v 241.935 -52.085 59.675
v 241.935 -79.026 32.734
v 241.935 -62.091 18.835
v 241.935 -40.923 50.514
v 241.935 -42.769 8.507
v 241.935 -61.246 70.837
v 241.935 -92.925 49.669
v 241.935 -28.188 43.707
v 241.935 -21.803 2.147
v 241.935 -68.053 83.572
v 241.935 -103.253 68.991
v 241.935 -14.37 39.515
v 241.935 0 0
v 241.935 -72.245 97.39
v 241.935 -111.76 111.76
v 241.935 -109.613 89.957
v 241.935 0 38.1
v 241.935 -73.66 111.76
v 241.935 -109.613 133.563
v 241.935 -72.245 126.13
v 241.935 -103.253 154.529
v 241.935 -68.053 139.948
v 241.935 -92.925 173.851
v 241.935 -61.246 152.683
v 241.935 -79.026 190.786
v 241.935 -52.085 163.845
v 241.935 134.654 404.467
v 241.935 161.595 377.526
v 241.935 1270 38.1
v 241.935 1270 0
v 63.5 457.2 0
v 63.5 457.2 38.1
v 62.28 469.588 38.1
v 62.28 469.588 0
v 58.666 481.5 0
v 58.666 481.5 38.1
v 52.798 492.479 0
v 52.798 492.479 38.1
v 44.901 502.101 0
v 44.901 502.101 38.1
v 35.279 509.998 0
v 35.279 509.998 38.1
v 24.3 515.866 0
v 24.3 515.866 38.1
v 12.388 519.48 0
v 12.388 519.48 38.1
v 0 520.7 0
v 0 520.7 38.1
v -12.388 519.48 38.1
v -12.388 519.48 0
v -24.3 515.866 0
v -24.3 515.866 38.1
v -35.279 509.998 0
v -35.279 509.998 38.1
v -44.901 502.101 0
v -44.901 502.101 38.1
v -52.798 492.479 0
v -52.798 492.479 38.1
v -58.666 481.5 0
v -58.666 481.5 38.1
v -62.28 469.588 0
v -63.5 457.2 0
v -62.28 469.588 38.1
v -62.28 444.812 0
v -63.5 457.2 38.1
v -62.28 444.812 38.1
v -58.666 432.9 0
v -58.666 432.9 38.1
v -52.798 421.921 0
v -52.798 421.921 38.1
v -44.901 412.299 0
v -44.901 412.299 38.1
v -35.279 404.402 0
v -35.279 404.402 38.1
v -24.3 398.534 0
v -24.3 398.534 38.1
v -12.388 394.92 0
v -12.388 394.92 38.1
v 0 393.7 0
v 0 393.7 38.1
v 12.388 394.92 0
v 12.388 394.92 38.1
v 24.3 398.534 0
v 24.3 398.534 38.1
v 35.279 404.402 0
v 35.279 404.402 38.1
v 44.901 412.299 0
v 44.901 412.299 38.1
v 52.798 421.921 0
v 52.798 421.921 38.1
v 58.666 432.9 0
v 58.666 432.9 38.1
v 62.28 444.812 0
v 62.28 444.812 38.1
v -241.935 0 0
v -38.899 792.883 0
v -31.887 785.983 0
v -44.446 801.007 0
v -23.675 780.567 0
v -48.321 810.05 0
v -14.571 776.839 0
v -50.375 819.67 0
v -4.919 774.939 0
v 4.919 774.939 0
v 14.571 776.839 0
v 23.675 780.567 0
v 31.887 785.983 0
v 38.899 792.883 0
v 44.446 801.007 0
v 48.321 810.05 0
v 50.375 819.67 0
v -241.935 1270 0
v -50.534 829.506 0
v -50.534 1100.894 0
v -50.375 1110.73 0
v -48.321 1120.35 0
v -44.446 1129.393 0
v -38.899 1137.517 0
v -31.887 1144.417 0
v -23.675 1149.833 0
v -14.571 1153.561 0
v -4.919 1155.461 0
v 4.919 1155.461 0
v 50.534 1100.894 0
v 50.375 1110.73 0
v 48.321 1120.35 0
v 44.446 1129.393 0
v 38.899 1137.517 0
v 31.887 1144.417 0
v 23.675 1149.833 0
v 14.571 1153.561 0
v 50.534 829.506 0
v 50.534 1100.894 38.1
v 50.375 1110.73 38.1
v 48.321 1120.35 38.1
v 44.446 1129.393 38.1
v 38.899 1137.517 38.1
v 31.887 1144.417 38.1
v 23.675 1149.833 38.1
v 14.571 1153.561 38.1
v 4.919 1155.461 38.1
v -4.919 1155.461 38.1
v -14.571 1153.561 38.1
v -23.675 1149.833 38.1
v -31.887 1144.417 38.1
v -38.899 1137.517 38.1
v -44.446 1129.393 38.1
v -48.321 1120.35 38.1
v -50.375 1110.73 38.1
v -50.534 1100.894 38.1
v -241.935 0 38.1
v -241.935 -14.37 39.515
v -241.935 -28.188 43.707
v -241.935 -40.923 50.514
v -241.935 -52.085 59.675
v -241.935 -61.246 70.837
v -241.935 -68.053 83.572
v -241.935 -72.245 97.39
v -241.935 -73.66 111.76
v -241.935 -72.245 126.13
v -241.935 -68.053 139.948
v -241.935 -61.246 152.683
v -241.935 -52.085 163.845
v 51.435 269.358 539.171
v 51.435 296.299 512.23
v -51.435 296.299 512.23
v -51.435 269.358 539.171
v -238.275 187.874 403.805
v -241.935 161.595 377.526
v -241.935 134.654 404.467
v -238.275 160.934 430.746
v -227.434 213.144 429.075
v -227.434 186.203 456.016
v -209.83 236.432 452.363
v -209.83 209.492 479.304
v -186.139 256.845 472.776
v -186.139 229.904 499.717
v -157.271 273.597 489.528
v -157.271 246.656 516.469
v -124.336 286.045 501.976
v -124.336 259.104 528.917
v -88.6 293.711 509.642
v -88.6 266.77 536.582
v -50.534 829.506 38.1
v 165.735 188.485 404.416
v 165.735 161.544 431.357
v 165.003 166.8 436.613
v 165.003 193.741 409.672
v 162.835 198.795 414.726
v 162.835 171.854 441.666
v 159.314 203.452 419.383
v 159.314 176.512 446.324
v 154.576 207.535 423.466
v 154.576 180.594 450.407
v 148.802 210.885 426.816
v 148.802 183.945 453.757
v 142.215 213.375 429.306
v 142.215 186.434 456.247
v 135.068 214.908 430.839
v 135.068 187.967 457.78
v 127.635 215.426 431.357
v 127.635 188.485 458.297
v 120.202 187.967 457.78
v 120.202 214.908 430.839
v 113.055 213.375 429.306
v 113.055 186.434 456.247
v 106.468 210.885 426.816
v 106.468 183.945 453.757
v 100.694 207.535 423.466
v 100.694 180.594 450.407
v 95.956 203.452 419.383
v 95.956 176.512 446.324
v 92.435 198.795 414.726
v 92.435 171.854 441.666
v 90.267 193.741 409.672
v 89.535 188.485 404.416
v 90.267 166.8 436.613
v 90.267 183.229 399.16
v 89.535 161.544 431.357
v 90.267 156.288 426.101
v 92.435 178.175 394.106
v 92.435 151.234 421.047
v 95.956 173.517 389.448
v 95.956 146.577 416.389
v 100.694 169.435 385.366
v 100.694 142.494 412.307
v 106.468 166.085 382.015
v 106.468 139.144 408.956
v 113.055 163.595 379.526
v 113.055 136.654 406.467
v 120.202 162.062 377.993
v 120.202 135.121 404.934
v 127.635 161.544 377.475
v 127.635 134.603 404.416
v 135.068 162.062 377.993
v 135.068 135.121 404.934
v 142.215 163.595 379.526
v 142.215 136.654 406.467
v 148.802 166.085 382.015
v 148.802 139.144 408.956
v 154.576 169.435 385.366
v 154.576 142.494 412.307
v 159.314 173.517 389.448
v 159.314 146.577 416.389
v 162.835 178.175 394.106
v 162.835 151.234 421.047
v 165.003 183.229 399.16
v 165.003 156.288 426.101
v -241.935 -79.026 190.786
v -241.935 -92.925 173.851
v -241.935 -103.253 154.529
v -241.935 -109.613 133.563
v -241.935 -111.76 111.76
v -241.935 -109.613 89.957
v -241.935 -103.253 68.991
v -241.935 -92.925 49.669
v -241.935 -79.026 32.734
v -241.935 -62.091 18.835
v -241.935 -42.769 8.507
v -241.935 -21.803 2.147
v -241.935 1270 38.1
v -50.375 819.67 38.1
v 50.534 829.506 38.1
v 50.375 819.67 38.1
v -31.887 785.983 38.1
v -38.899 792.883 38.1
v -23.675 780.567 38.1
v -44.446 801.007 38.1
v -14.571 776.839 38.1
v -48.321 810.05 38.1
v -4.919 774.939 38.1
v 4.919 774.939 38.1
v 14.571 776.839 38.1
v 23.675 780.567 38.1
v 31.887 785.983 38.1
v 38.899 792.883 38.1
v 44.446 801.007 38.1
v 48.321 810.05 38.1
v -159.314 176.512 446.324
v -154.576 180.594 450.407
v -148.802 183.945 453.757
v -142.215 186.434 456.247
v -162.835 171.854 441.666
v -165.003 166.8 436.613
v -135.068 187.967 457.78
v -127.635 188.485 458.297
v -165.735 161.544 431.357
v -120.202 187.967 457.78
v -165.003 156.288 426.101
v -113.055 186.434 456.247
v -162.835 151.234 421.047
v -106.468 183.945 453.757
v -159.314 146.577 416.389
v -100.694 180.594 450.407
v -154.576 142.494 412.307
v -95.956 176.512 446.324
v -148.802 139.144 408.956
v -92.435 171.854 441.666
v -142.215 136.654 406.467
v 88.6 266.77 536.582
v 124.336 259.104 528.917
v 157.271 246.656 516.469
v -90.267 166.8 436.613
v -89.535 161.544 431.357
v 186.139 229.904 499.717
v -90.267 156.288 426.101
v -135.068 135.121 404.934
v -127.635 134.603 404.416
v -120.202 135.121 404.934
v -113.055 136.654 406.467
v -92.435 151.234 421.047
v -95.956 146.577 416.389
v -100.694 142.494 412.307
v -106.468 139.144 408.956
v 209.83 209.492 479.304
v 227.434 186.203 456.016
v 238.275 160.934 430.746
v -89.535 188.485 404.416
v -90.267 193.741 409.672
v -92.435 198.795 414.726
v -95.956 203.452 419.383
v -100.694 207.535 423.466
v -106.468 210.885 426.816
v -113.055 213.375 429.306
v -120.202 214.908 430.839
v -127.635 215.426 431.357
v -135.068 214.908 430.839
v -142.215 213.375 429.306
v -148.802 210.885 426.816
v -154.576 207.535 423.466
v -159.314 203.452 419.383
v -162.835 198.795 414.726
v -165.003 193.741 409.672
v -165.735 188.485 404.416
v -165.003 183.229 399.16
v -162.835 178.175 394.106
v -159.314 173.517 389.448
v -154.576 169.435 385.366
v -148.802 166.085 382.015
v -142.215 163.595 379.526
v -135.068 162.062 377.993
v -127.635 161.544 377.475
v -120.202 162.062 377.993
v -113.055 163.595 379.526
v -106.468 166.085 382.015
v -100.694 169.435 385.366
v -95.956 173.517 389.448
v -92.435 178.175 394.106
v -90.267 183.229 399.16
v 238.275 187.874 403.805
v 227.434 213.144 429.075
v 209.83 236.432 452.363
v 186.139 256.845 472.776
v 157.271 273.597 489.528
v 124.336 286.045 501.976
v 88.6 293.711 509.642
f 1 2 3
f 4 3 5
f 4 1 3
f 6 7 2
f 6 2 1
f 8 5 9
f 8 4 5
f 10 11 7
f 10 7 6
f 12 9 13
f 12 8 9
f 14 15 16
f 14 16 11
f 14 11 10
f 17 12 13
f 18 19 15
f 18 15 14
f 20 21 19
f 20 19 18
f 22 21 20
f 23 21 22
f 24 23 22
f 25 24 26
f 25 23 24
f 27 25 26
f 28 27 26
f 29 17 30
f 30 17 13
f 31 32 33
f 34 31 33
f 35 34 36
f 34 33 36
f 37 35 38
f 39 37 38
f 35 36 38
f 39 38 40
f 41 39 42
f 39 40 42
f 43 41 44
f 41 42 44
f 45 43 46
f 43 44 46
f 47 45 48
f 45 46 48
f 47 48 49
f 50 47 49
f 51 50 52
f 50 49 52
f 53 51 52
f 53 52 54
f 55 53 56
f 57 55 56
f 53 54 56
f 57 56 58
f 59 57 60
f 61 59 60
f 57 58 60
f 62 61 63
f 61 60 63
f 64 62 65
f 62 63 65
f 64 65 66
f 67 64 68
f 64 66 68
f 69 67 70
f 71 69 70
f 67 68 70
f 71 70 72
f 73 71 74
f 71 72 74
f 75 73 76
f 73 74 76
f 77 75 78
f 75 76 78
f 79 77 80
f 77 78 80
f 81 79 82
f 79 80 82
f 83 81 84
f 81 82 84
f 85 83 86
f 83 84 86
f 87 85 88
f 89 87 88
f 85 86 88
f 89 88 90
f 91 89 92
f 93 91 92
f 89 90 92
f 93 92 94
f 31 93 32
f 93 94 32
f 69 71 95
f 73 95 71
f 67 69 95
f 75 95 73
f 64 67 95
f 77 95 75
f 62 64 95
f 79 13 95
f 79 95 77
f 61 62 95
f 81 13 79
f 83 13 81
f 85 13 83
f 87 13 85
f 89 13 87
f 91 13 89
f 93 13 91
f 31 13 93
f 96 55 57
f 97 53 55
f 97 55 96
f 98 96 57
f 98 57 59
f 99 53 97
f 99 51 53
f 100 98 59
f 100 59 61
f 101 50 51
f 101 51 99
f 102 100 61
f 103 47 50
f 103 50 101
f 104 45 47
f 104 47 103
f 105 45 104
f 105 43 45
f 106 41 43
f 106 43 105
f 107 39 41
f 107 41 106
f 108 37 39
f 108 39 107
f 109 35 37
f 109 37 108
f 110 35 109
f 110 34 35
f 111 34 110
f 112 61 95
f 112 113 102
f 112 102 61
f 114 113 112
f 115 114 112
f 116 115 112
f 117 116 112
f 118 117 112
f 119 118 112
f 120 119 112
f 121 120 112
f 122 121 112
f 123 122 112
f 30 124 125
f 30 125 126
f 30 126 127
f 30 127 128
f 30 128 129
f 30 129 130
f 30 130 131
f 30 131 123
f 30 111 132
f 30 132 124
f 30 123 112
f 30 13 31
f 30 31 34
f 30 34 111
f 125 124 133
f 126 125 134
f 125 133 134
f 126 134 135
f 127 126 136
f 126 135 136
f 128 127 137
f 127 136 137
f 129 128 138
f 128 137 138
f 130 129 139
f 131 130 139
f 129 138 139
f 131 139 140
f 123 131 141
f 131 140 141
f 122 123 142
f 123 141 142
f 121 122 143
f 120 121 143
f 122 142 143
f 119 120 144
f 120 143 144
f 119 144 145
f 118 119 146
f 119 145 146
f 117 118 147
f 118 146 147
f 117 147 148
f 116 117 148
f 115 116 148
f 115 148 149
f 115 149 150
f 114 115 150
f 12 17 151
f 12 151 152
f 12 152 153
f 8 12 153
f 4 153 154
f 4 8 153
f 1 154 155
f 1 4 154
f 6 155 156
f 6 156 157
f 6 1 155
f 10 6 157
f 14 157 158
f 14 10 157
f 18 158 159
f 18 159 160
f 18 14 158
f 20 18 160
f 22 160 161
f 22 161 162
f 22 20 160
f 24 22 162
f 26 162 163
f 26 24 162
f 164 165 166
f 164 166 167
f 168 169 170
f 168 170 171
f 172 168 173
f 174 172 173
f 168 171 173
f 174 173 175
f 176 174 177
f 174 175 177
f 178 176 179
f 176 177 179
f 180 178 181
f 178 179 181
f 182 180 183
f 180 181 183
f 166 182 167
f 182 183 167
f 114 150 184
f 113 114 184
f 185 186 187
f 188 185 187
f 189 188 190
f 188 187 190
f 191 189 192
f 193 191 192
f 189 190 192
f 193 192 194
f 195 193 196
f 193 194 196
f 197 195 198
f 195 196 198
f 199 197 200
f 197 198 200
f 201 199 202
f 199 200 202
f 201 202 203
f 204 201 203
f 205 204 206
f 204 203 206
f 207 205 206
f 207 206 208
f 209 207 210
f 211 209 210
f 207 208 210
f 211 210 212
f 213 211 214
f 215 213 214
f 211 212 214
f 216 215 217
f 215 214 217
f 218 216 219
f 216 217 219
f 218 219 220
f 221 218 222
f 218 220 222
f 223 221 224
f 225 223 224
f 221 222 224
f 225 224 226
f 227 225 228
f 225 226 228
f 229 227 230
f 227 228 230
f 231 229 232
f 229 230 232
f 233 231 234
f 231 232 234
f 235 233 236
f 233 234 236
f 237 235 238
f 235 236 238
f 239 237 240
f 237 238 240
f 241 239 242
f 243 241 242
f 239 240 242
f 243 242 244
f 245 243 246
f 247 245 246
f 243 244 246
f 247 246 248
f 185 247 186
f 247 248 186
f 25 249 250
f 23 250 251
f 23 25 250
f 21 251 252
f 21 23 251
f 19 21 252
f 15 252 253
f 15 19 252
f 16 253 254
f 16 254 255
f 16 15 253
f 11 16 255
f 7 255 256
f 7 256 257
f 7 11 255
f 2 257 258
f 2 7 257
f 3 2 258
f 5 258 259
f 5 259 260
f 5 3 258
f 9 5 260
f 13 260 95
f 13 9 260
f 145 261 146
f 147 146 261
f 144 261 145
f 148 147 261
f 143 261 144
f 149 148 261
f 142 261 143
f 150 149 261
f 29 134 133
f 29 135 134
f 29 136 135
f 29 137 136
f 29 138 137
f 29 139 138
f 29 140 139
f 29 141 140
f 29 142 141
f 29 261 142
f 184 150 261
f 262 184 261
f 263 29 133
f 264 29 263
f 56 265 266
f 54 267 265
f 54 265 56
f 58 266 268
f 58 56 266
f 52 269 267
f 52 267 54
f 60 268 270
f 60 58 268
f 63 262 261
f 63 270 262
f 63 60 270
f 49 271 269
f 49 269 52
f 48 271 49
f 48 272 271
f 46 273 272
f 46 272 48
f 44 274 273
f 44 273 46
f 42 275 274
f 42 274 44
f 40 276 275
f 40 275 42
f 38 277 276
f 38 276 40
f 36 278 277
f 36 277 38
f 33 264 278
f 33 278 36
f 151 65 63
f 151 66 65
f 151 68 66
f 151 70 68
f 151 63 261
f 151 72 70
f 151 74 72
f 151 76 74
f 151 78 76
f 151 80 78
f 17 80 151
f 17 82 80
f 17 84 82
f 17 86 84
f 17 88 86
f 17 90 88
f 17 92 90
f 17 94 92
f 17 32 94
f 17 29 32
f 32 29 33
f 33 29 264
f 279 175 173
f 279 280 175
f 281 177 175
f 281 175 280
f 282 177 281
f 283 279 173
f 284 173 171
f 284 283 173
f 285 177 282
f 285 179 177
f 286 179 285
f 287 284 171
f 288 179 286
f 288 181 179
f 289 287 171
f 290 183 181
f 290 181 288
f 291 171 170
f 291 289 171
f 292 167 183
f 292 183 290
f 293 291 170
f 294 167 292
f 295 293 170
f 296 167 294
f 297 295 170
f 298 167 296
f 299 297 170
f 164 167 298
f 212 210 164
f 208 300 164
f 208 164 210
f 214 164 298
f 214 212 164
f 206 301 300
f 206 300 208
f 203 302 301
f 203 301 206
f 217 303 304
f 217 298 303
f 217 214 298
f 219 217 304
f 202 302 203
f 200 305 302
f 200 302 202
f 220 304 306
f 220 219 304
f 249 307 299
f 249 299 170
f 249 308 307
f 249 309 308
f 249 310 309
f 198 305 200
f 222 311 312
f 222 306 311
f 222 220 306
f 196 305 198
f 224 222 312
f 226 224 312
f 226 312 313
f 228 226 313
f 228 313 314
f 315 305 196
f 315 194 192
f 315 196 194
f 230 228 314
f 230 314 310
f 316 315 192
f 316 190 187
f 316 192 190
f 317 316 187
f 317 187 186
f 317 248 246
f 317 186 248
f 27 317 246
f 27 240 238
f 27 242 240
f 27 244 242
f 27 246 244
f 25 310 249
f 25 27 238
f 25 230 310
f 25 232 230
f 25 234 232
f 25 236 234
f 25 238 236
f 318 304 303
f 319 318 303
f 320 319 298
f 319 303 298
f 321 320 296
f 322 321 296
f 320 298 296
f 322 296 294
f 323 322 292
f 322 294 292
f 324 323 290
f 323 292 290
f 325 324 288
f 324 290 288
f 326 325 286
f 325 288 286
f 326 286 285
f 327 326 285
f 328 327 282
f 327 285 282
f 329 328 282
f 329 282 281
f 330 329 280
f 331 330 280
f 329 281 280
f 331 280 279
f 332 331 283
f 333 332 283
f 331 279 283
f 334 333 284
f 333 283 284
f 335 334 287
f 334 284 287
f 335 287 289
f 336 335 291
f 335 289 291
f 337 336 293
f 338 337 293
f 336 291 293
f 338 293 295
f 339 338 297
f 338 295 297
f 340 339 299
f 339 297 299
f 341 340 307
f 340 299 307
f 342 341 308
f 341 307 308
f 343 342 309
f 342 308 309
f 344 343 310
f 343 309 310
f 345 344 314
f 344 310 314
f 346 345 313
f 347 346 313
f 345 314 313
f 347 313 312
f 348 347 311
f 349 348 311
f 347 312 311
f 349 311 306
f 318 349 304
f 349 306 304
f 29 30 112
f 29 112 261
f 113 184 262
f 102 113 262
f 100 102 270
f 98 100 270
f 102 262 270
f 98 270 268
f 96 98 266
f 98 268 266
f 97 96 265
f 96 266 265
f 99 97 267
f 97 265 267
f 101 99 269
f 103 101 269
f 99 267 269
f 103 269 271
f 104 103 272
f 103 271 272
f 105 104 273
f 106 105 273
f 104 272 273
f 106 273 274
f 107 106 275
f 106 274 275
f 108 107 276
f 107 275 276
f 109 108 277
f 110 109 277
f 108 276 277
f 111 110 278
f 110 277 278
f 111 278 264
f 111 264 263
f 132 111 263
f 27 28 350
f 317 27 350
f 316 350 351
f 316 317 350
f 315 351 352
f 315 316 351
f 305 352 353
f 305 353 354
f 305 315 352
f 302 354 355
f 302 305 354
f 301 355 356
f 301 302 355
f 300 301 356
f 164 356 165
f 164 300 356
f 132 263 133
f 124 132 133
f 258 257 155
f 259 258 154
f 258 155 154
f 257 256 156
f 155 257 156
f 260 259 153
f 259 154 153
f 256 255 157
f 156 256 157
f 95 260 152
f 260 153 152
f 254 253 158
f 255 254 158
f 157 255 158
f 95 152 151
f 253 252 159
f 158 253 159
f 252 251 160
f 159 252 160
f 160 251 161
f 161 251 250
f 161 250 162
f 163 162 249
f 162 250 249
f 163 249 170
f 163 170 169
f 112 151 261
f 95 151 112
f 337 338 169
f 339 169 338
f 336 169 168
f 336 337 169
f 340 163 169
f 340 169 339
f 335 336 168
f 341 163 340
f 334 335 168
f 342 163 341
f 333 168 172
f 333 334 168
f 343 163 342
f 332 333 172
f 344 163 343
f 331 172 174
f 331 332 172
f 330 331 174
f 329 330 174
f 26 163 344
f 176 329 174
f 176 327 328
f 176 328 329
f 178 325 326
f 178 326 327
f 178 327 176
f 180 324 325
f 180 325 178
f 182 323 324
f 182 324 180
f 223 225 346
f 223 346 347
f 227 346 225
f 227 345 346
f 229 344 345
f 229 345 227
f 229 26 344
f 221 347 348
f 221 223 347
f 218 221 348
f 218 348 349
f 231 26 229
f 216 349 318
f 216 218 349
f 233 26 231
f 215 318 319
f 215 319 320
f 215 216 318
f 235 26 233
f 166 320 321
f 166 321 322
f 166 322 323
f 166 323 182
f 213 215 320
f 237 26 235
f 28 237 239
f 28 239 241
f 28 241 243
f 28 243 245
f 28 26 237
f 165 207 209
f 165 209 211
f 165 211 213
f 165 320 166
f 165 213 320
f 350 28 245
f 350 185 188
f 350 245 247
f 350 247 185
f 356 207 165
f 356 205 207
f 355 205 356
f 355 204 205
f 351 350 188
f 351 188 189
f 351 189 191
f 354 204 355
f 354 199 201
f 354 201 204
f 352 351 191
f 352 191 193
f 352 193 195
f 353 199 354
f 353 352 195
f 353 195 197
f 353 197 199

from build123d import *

# Parameters (mm, degrees)
F1_DEPTH = 241.935
F2_R     = 38.1
F3_DEPTH = 38.1000004709
F4_R     = 63.5
F5_DEPTH = 38.1000004709
F6_R     = 190.5


with BuildPart() as f1:
    # F0 (on Right) → F1 (new body, symmetric)
    with BuildSketch(Plane.YZ):
        with BuildLine():
            Line((0, 0), (1270, 0))
            Line((1270, 0), (1270, 38.1000004709))
            Line((1270, 38.1000004709), (0, 38.1000004709))
            ThreePointArc((0, 38.1000004709), (-68.0529659297, 83.5715385522), (-52.0854851692, 163.8454851692))
            Line((-52.0854851692, 163.8454851692), (296.2988816537, 512.2298519922))
            Line((296.2988816537, 512.2298519922), (269.3581129575, 539.1706206883))
            Line((269.3581129575, 539.1706206883), (-79.0262538654, 190.7862538654))
            ThreePointArc((-79.0262538654, 190.7862538654), (-103.2527765535, 68.9912995989), (0, 0))
        make_face()
    extrude(amount=F1_DEPTH, both=True)

    # F2 (on face) → F3 (cut, through all)
    with BuildSketch(Plane(origin=(0, -134.9062538654, 134.9062538654), x_dir=(1, 0, 0), z_dir=(0, -0.7071067812, 0.7071067812))):
        with Locations((-127.635, 419.2442297935)):
            Circle(F2_R)
        with Locations((127.635, 419.2442297935)):
            Circle(F2_R)
    extrude(amount=-F3_DEPTH, mode=Mode.SUBTRACT)

    # F4 (on face) → F5 (cut, through all)
    with BuildSketch(Plane.XY.offset(38.1000004709)):
        with Locations((0, 457.2)):
            Circle(F4_R)
        with BuildLine():
            Line((-50.5338093541, 1100.8937581723), (-50.5338093541, 829.5062418277))
            ThreePointArc((-50.5338093541, 829.5062418277), (0, 774.7), (50.5338093541, 829.5062418277))
            Line((50.5338093541, 829.5062418277), (50.5338093541, 1100.8937581723))
            ThreePointArc((50.5338093541, 1100.8937581723), (0, 1155.7), (-50.5338093541, 1100.8937581723))
        make_face()
    extrude(amount=-F5_DEPTH, mode=Mode.SUBTRACT)

    # F6
    f6_edges = [f1.edges().sort_by_distance(p)[0] for p in [
        (-241.935, 282.828497, 525.700236),
        (241.935, 282.828497, 525.700236),
    ]]
    fillet(f6_edges, radius=F6_R)


solid = f1.part
